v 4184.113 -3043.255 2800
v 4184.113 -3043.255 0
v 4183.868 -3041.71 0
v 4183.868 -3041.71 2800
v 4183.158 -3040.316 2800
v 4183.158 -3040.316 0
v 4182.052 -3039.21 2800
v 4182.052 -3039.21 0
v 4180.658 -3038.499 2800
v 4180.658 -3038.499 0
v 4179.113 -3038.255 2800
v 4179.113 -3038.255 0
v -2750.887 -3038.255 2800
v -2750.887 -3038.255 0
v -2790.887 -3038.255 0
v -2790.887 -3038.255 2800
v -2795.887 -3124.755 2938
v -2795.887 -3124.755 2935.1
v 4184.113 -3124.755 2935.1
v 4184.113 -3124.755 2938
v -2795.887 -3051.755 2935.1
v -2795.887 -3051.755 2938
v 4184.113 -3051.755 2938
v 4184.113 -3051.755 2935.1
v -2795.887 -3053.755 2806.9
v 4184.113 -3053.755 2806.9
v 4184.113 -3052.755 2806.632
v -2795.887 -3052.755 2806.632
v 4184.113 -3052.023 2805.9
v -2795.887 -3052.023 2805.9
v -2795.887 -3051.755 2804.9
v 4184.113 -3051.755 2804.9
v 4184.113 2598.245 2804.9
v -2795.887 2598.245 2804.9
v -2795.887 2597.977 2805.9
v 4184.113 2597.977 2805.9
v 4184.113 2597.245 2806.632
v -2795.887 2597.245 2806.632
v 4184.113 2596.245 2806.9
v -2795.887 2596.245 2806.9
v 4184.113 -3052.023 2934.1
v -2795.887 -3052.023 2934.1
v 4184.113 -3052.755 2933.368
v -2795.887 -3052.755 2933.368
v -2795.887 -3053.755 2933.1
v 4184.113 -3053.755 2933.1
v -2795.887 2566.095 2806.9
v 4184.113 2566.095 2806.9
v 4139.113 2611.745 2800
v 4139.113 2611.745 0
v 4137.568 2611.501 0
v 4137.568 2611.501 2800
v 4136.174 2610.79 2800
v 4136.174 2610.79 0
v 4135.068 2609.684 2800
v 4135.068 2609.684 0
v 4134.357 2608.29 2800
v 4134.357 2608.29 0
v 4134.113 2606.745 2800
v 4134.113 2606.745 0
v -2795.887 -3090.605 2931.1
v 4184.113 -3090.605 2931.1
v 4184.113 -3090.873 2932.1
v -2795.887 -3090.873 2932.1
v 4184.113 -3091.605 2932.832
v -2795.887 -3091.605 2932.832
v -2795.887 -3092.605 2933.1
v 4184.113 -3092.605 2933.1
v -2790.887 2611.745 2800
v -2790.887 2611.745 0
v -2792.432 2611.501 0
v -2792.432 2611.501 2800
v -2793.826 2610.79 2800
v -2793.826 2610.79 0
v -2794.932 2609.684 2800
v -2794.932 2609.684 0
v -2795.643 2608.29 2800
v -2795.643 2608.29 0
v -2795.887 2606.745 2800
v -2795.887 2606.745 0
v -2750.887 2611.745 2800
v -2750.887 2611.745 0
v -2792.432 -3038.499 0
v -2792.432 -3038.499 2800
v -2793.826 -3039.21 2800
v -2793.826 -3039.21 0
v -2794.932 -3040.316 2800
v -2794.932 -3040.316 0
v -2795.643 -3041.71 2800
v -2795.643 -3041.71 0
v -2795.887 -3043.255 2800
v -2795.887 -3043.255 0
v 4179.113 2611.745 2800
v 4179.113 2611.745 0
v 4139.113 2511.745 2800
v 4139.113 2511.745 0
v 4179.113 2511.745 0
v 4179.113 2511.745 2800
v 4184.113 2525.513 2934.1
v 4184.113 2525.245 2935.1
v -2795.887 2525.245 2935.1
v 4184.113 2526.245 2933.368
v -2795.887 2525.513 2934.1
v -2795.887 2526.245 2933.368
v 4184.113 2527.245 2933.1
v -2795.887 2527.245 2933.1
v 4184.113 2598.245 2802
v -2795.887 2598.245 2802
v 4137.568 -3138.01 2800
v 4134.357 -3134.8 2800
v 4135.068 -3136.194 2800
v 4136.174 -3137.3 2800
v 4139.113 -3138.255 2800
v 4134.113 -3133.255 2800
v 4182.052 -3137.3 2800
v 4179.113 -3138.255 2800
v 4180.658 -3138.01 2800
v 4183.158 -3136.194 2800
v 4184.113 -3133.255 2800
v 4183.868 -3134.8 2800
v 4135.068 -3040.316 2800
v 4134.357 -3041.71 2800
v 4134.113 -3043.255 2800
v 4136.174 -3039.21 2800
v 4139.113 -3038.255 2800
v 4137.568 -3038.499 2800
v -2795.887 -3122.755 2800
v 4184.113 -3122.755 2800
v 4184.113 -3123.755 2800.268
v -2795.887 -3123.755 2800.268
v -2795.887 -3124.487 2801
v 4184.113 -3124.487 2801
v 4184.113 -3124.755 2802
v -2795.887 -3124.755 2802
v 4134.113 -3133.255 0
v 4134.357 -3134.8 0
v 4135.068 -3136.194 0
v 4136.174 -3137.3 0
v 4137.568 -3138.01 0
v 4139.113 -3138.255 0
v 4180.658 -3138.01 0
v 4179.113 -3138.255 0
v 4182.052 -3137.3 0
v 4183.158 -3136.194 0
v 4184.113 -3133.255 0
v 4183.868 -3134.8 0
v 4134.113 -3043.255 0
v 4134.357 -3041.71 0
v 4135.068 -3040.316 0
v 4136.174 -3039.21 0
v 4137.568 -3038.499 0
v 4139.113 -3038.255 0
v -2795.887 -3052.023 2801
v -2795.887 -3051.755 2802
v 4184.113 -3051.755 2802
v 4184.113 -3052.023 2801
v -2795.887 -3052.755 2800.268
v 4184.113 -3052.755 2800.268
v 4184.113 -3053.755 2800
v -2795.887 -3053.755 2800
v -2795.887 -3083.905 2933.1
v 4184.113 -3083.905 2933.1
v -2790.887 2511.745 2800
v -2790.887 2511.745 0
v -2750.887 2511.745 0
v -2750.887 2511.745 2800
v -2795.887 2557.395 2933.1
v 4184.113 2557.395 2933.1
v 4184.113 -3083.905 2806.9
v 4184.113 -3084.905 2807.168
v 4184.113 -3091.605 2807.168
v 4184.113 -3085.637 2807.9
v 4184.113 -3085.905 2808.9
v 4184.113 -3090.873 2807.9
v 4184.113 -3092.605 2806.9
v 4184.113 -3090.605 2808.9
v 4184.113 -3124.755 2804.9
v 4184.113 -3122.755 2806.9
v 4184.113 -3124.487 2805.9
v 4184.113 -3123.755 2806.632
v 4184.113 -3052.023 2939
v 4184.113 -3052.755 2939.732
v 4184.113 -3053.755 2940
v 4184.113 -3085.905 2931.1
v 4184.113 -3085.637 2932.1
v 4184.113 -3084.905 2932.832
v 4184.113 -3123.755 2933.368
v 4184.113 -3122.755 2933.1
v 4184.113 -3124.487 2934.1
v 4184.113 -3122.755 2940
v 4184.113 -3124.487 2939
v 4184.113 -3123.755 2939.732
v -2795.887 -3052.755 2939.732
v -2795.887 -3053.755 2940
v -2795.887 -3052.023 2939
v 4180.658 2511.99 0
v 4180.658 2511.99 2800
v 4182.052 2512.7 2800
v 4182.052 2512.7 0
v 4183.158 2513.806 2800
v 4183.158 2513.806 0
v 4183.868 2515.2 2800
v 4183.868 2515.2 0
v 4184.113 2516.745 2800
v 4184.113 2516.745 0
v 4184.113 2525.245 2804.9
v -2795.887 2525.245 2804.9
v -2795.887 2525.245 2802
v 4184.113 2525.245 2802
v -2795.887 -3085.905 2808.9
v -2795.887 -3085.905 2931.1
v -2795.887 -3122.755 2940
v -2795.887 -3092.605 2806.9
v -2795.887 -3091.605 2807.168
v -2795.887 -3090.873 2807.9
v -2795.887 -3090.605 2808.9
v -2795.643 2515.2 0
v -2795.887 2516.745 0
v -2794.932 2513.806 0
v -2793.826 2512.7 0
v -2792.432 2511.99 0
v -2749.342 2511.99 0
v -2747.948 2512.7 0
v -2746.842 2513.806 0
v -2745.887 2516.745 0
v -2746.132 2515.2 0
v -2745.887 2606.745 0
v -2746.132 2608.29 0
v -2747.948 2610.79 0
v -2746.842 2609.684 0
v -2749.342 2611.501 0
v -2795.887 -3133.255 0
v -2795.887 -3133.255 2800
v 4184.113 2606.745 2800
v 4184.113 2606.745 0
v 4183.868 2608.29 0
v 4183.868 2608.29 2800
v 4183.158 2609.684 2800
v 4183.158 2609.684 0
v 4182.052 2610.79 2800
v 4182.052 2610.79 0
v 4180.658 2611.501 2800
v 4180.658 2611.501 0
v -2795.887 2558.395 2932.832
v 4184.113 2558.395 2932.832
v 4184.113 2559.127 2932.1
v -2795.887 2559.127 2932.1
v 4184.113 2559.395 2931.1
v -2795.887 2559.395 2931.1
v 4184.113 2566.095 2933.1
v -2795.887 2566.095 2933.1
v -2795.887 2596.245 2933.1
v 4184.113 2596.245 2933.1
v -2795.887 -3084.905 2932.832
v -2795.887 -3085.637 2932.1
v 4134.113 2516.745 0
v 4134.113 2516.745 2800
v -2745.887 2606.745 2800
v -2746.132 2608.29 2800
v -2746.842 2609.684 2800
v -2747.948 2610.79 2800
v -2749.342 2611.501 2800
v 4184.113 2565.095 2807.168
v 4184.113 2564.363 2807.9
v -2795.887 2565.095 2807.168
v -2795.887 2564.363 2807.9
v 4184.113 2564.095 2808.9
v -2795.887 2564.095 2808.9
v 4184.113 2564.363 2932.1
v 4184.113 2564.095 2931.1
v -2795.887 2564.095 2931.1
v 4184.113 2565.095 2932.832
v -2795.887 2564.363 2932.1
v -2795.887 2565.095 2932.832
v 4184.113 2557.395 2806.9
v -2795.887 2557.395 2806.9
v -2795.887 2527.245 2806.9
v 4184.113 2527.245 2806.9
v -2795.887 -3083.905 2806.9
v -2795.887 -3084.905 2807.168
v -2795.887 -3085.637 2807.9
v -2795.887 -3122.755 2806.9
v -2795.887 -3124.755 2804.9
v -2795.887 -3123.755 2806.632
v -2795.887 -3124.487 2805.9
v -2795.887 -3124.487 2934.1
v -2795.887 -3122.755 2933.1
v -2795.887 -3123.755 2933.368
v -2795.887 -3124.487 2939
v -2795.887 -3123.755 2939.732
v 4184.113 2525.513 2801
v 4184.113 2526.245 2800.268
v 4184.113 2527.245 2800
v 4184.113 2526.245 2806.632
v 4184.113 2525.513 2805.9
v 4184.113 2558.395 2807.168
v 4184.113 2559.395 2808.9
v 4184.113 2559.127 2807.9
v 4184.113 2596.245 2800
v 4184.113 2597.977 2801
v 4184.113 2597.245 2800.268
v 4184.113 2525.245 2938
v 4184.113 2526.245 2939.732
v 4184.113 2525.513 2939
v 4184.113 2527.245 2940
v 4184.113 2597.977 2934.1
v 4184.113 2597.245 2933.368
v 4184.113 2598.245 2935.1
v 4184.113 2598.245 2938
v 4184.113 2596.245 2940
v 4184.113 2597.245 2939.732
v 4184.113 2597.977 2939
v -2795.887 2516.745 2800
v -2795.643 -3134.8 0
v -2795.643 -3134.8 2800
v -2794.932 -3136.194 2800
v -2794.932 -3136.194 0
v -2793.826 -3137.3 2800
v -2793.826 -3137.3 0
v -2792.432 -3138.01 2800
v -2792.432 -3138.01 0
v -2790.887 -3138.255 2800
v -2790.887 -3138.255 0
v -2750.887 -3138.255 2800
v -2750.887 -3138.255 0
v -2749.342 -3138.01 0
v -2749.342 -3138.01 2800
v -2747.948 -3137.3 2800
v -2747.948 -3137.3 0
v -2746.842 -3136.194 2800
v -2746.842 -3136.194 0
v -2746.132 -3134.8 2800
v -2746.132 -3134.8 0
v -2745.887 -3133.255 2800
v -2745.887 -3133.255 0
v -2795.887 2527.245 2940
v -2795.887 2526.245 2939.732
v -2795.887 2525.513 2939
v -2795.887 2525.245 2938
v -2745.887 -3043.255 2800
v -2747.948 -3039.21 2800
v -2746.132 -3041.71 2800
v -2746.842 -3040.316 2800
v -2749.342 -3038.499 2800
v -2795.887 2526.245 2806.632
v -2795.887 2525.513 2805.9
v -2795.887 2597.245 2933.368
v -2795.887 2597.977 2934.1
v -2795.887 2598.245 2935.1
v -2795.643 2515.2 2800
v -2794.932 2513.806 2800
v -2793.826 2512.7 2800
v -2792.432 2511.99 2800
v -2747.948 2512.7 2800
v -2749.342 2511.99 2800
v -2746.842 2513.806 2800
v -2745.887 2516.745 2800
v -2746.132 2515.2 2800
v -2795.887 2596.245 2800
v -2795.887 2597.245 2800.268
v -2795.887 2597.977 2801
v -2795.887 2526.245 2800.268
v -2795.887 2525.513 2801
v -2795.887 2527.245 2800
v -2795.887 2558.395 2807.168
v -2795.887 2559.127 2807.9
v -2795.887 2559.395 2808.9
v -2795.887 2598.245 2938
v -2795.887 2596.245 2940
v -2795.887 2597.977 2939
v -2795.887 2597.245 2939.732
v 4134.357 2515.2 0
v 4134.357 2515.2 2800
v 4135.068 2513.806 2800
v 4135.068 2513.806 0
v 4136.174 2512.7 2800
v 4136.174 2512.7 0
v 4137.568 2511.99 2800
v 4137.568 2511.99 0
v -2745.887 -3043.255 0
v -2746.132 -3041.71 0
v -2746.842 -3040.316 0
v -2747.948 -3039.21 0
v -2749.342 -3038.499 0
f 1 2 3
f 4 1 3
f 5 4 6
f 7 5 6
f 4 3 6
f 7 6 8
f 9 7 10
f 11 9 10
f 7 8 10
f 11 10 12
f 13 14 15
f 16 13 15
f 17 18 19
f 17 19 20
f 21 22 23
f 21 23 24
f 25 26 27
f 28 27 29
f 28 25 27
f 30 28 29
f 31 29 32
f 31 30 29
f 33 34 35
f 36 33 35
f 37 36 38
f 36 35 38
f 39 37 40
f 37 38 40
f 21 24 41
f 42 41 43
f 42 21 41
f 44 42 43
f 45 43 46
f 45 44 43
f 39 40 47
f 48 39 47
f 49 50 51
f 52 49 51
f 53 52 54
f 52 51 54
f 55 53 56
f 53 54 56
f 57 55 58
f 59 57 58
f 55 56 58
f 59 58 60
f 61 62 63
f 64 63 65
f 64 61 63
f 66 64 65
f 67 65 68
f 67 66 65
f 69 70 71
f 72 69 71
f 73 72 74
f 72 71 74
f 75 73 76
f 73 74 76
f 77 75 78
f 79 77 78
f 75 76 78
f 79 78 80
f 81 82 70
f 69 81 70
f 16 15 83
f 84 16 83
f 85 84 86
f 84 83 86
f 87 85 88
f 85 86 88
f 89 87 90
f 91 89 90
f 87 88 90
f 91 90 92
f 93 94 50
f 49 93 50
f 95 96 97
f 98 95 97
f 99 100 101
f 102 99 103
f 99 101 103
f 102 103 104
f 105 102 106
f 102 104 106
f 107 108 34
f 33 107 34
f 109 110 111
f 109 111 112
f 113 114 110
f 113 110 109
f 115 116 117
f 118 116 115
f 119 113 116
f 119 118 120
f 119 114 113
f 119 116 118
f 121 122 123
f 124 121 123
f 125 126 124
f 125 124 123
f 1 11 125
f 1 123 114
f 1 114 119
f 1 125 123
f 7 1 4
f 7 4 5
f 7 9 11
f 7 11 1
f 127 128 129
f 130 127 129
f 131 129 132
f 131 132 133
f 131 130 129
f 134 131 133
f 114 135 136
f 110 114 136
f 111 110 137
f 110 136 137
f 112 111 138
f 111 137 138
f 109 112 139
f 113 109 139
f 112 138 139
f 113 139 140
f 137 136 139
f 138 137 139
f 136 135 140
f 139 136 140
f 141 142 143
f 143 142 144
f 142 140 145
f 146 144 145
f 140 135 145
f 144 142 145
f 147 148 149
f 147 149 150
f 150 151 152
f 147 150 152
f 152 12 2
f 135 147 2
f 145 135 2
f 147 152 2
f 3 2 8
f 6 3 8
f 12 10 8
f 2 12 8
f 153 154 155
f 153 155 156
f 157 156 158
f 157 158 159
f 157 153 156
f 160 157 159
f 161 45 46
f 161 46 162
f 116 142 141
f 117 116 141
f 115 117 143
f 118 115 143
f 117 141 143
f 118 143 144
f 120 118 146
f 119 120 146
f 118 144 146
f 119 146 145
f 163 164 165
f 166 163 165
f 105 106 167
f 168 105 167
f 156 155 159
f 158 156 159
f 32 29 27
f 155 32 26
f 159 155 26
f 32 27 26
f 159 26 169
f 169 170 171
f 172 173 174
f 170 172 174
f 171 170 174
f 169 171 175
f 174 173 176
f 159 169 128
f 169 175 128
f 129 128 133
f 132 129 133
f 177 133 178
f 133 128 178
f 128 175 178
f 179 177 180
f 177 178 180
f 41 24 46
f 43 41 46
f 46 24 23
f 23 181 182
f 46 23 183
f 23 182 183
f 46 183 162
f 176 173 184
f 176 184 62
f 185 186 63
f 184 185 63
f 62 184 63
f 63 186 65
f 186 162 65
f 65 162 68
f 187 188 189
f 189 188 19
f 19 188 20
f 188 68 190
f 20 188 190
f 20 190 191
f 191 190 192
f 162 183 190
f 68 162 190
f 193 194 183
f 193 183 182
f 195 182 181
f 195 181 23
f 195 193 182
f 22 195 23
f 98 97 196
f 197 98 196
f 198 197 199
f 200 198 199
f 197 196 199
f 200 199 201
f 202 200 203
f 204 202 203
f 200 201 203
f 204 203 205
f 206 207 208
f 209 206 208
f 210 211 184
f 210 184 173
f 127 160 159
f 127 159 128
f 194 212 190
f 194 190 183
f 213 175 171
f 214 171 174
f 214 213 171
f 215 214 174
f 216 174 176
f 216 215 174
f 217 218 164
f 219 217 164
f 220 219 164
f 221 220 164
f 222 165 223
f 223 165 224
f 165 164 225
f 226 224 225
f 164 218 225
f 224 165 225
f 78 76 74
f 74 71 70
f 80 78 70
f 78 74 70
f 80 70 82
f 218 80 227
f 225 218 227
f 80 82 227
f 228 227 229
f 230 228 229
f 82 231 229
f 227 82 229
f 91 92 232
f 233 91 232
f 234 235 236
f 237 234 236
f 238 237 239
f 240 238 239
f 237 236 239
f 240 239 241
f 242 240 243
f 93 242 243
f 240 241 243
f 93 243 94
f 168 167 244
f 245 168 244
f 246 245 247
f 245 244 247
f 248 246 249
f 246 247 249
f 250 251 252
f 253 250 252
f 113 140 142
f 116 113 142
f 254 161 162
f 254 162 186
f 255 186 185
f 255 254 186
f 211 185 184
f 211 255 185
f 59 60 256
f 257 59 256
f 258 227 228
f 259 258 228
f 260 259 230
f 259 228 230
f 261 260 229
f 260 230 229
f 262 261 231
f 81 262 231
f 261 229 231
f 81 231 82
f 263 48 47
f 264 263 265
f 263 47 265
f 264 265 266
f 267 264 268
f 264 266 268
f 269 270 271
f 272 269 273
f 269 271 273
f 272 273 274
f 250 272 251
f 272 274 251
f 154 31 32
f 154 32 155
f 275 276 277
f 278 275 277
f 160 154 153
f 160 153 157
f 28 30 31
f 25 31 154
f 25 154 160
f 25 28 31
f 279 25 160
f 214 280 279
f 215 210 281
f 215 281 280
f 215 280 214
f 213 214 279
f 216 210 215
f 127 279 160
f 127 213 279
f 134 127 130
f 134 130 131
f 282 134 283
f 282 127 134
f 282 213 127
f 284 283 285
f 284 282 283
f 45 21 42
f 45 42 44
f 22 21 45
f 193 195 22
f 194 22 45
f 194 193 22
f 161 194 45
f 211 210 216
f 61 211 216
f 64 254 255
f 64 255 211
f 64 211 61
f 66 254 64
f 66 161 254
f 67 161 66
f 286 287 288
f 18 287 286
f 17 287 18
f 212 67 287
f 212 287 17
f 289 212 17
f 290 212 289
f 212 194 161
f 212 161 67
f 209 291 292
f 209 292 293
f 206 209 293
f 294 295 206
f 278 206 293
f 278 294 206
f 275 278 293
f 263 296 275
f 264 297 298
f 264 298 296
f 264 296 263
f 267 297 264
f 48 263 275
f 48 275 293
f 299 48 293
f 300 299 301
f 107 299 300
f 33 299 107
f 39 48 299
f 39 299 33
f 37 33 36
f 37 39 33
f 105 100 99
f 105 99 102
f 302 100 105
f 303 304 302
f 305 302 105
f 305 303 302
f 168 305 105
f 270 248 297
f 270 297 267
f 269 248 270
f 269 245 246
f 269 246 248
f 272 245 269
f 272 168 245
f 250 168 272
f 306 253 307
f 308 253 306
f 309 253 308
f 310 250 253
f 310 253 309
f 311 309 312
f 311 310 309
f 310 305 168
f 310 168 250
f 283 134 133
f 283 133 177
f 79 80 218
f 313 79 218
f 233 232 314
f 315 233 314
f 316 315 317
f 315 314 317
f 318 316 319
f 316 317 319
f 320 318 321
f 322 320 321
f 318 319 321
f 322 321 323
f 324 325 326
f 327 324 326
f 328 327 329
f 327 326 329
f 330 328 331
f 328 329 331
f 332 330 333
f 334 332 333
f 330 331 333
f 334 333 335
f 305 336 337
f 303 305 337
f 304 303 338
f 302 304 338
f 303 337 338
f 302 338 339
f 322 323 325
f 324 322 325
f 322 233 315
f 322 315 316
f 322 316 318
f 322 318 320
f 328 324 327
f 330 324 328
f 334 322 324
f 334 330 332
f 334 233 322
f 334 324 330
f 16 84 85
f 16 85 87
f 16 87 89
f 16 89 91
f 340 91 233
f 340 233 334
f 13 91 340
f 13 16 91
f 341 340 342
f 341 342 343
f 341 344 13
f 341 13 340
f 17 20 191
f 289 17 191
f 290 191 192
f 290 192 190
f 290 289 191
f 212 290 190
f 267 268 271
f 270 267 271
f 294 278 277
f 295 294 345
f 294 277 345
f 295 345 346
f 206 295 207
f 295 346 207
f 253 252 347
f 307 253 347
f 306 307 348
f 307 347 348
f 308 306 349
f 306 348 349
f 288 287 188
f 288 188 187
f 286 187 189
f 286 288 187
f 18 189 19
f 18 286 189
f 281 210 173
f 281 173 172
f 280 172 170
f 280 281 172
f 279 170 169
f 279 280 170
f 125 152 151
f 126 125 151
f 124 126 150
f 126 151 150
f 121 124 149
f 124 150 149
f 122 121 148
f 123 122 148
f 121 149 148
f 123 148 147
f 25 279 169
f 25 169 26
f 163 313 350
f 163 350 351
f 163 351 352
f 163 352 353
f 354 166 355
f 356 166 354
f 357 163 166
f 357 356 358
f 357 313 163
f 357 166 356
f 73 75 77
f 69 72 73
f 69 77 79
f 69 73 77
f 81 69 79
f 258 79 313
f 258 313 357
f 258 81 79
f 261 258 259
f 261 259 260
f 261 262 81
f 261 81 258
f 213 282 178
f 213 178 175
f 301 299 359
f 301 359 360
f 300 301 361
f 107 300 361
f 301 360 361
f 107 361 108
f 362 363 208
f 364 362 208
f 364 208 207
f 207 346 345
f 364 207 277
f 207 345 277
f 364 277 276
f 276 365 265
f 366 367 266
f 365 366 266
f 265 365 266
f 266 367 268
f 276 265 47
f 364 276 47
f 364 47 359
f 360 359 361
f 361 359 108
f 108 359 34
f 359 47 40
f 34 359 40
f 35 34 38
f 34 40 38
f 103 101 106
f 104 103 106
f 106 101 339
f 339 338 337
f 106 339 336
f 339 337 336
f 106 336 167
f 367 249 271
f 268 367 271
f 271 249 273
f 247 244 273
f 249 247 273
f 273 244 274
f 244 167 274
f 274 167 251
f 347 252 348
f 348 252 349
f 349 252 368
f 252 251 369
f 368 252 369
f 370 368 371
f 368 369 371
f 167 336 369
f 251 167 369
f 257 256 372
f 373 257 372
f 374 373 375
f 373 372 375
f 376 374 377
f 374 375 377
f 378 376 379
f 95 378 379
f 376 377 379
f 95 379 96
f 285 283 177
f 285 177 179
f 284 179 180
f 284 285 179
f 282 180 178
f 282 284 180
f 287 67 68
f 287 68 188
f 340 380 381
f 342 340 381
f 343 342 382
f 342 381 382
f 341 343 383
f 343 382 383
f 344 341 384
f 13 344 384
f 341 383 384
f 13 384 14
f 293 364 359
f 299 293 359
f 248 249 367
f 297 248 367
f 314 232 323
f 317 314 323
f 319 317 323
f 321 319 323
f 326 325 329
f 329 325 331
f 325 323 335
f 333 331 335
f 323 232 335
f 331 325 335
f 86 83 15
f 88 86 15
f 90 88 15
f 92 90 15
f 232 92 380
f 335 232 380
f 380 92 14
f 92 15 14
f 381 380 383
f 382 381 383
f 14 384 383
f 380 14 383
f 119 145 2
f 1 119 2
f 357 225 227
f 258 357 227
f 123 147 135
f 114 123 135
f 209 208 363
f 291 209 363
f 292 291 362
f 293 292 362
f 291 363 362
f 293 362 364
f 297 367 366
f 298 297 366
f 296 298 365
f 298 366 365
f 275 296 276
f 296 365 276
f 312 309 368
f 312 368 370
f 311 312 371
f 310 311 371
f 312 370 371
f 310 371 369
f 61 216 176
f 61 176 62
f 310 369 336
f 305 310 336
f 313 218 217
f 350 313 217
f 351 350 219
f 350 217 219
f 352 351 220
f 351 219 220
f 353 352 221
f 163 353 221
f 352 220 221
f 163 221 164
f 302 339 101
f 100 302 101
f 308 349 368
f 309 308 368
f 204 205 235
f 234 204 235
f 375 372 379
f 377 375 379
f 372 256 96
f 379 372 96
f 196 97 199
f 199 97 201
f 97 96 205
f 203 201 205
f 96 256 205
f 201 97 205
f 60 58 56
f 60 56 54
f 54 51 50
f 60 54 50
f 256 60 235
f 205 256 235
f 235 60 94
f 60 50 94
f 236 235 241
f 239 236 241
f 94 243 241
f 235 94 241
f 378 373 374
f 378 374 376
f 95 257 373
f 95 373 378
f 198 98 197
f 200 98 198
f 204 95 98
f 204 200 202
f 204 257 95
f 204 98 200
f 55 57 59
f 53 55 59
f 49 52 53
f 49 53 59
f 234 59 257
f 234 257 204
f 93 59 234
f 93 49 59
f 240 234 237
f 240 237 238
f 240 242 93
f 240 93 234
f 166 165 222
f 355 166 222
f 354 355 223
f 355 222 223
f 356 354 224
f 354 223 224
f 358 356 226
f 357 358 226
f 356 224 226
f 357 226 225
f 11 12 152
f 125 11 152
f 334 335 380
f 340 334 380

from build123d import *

# Parameters (mm, degrees)
F2_DEPTH = 2800
F4_DEPTH = 6980


with BuildPart() as f2:
    # F1 (on face) → F2 (new body)
    with BuildSketch(Plane.XY):
        with BuildLine():
            Line((-2750.887222, 2611.745315), (-2790.887222, 2611.745315))
            ThreePointArc((-2790.887222, 2611.745315), (-2794.422756, 2610.280849), (-2795.887222, 2606.745315))
            Line((-2795.887222, 2606.745315), (-2795.887222, 2516.745315))
            ThreePointArc((-2795.887222, 2516.745315), (-2794.422756, 2513.209781), (-2790.887222, 2511.745315))
            Line((-2790.887222, 2511.745315), (-2750.887222, 2511.745315))
            ThreePointArc((-2750.887222, 2511.745315), (-2747.351688, 2513.209781), (-2745.887222, 2516.745315))
            Line((-2745.887222, 2516.745315), (-2745.887222, 2606.745315))
            ThreePointArc((-2745.887222, 2606.745315), (-2747.351688, 2610.280849), (-2750.887222, 2611.745315))
        make_face()
        with BuildLine():
            ThreePointArc((-2790.887222, -3038.254685), (-2794.422756, -3039.719151), (-2795.887222, -3043.254685))
            Line((-2795.887222, -3043.254685), (-2795.887222, -3133.254685))
            ThreePointArc((-2795.887222, -3133.254685), (-2794.422756, -3136.790219), (-2790.887222, -3138.254685))
            Line((-2790.887222, -3138.254685), (-2750.887222, -3138.254685))
            ThreePointArc((-2750.887222, -3138.254685), (-2747.351688, -3136.790219), (-2745.887222, -3133.254685))
            Line((-2745.887222, -3133.254685), (-2745.887222, -3043.254685))
            ThreePointArc((-2745.887222, -3043.254685), (-2747.351688, -3039.719151), (-2750.887222, -3038.254685))
            Line((-2750.887222, -3038.254685), (-2790.887222, -3038.254685))
        make_face()
        with BuildLine():
            Line((4179.112778, -3038.254685), (4139.112778, -3038.254685))
            ThreePointArc((4139.112778, -3038.254685), (4135.577244, -3039.719151), (4134.112778, -3043.254685))
            Line((4134.112778, -3043.254685), (4134.112778, -3133.254685))
            ThreePointArc((4134.112778, -3133.254685), (4135.577244, -3136.790219), (4139.112778, -3138.254685))
            Line((4139.112778, -3138.254685), (4179.112778, -3138.254685))
            ThreePointArc((4179.112778, -3138.254685), (4182.648312, -3136.790219), (4184.112778, -3133.254685))
            Line((4184.112778, -3133.254685), (4184.112778, -3043.254685))
            ThreePointArc((4184.112778, -3043.254685), (4182.648312, -3039.719151), (4179.112778, -3038.254685))
        make_face()
        with BuildLine():
            Line((4139.112778, 2511.745315), (4179.112778, 2511.745315))
            ThreePointArc((4179.112778, 2511.745315), (4182.648312, 2513.209781), (4184.112778, 2516.745315))
            Line((4184.112778, 2516.745315), (4184.112778, 2606.745315))
            ThreePointArc((4184.112778, 2606.745315), (4182.648312, 2610.280849), (4179.112778, 2611.745315))
            Line((4179.112778, 2611.745315), (4139.112778, 2611.745315))
            ThreePointArc((4139.112778, 2611.745315), (4135.577244, 2610.280849), (4134.112778, 2606.745315))
            Line((4134.112778, 2606.745315), (4134.112778, 2516.745315))
            ThreePointArc((4134.112778, 2516.745315), (4135.577244, 2513.209781), (4139.112778, 2511.745315))
        make_face()
    extrude(amount=F2_DEPTH)


with BuildPart() as f4:
    # F3 (on face) → F4 (new body, through all)
    with BuildSketch(Plane(origin=(-2795.887222, 0, 0), x_dir=(0, -1, 0), z_dir=(-1, 0, 0))):
        with BuildLine():
            ThreePointArc((3051.754685, 2802), (3052.340471, 2800.585786), (3053.754685, 2800))
            Line((3053.754685, 2800), (3088.254685, 2800))
            Line((3088.254685, 2800), (3122.754685, 2800))
            ThreePointArc((3122.754685, 2800), (3124.168898, 2800.585786), (3124.754685, 2802))
            Line((3124.754685, 2802), (3124.754685, 2804.9))
            ThreePointArc((3124.754685, 2804.9), (3124.168898, 2806.314214), (3122.754685, 2806.9))
            Line((3122.754685, 2806.9), (3092.604685, 2806.9))
            ThreePointArc((3092.604685, 2806.9), (3091.190471, 2807.485786), (3090.604685, 2808.9))
            Line((3090.604685, 2808.9), (3090.604685, 2931.1))
            ThreePointArc((3090.604685, 2931.1), (3091.190471, 2932.514214), (3092.604685, 2933.1))
            Line((3092.604685, 2933.1), (3122.754685, 2933.1))
            ThreePointArc((3122.754685, 2933.1), (3124.168898, 2933.685786), (3124.754685, 2935.1))
            Line((3124.754685, 2935.1), (3124.754685, 2938))
            ThreePointArc((3124.754685, 2938), (3124.168898, 2939.414214), (3122.754685, 2940))
            Line((3122.754685, 2940), (3088.254685, 2940))
            Line((3088.254685, 2940), (3053.754685, 2940))
            ThreePointArc((3053.754685, 2940), (3052.340471, 2939.414214), (3051.754685, 2938))
            Line((3051.754685, 2938), (3051.754685, 2935.1))
            ThreePointArc((3051.754685, 2935.1), (3052.340471, 2933.685786), (3053.754685, 2933.1))
            Line((3053.754685, 2933.1), (3083.904685, 2933.1))
            ThreePointArc((3083.904685, 2933.1), (3085.318898, 2932.514214), (3085.904685, 2931.1))
            Line((3085.904685, 2931.1), (3085.904685, 2808.9))
            ThreePointArc((3085.904685, 2808.9), (3085.318898, 2807.485786), (3083.904685, 2806.9))
            Line((3083.904685, 2806.9), (3053.754685, 2806.9))
            ThreePointArc((3053.754685, 2806.9), (3052.340471, 2806.314214), (3051.754685, 2804.9))
            Line((3051.754685, 2804.9), (3051.754685, 2802))
        make_face()
    extrude(amount=-F4_DEPTH)


with BuildPart() as f6_1:
    # F6: instance of F4
    add(f4.part.mirror(Plane(origin=(-2770.887222, -263.254685, 1400), x_dir=(1, 0, 0), z_dir=(0, -1, 0))))


solid = Compound([f2.part, f4.part, f6_1.part])
